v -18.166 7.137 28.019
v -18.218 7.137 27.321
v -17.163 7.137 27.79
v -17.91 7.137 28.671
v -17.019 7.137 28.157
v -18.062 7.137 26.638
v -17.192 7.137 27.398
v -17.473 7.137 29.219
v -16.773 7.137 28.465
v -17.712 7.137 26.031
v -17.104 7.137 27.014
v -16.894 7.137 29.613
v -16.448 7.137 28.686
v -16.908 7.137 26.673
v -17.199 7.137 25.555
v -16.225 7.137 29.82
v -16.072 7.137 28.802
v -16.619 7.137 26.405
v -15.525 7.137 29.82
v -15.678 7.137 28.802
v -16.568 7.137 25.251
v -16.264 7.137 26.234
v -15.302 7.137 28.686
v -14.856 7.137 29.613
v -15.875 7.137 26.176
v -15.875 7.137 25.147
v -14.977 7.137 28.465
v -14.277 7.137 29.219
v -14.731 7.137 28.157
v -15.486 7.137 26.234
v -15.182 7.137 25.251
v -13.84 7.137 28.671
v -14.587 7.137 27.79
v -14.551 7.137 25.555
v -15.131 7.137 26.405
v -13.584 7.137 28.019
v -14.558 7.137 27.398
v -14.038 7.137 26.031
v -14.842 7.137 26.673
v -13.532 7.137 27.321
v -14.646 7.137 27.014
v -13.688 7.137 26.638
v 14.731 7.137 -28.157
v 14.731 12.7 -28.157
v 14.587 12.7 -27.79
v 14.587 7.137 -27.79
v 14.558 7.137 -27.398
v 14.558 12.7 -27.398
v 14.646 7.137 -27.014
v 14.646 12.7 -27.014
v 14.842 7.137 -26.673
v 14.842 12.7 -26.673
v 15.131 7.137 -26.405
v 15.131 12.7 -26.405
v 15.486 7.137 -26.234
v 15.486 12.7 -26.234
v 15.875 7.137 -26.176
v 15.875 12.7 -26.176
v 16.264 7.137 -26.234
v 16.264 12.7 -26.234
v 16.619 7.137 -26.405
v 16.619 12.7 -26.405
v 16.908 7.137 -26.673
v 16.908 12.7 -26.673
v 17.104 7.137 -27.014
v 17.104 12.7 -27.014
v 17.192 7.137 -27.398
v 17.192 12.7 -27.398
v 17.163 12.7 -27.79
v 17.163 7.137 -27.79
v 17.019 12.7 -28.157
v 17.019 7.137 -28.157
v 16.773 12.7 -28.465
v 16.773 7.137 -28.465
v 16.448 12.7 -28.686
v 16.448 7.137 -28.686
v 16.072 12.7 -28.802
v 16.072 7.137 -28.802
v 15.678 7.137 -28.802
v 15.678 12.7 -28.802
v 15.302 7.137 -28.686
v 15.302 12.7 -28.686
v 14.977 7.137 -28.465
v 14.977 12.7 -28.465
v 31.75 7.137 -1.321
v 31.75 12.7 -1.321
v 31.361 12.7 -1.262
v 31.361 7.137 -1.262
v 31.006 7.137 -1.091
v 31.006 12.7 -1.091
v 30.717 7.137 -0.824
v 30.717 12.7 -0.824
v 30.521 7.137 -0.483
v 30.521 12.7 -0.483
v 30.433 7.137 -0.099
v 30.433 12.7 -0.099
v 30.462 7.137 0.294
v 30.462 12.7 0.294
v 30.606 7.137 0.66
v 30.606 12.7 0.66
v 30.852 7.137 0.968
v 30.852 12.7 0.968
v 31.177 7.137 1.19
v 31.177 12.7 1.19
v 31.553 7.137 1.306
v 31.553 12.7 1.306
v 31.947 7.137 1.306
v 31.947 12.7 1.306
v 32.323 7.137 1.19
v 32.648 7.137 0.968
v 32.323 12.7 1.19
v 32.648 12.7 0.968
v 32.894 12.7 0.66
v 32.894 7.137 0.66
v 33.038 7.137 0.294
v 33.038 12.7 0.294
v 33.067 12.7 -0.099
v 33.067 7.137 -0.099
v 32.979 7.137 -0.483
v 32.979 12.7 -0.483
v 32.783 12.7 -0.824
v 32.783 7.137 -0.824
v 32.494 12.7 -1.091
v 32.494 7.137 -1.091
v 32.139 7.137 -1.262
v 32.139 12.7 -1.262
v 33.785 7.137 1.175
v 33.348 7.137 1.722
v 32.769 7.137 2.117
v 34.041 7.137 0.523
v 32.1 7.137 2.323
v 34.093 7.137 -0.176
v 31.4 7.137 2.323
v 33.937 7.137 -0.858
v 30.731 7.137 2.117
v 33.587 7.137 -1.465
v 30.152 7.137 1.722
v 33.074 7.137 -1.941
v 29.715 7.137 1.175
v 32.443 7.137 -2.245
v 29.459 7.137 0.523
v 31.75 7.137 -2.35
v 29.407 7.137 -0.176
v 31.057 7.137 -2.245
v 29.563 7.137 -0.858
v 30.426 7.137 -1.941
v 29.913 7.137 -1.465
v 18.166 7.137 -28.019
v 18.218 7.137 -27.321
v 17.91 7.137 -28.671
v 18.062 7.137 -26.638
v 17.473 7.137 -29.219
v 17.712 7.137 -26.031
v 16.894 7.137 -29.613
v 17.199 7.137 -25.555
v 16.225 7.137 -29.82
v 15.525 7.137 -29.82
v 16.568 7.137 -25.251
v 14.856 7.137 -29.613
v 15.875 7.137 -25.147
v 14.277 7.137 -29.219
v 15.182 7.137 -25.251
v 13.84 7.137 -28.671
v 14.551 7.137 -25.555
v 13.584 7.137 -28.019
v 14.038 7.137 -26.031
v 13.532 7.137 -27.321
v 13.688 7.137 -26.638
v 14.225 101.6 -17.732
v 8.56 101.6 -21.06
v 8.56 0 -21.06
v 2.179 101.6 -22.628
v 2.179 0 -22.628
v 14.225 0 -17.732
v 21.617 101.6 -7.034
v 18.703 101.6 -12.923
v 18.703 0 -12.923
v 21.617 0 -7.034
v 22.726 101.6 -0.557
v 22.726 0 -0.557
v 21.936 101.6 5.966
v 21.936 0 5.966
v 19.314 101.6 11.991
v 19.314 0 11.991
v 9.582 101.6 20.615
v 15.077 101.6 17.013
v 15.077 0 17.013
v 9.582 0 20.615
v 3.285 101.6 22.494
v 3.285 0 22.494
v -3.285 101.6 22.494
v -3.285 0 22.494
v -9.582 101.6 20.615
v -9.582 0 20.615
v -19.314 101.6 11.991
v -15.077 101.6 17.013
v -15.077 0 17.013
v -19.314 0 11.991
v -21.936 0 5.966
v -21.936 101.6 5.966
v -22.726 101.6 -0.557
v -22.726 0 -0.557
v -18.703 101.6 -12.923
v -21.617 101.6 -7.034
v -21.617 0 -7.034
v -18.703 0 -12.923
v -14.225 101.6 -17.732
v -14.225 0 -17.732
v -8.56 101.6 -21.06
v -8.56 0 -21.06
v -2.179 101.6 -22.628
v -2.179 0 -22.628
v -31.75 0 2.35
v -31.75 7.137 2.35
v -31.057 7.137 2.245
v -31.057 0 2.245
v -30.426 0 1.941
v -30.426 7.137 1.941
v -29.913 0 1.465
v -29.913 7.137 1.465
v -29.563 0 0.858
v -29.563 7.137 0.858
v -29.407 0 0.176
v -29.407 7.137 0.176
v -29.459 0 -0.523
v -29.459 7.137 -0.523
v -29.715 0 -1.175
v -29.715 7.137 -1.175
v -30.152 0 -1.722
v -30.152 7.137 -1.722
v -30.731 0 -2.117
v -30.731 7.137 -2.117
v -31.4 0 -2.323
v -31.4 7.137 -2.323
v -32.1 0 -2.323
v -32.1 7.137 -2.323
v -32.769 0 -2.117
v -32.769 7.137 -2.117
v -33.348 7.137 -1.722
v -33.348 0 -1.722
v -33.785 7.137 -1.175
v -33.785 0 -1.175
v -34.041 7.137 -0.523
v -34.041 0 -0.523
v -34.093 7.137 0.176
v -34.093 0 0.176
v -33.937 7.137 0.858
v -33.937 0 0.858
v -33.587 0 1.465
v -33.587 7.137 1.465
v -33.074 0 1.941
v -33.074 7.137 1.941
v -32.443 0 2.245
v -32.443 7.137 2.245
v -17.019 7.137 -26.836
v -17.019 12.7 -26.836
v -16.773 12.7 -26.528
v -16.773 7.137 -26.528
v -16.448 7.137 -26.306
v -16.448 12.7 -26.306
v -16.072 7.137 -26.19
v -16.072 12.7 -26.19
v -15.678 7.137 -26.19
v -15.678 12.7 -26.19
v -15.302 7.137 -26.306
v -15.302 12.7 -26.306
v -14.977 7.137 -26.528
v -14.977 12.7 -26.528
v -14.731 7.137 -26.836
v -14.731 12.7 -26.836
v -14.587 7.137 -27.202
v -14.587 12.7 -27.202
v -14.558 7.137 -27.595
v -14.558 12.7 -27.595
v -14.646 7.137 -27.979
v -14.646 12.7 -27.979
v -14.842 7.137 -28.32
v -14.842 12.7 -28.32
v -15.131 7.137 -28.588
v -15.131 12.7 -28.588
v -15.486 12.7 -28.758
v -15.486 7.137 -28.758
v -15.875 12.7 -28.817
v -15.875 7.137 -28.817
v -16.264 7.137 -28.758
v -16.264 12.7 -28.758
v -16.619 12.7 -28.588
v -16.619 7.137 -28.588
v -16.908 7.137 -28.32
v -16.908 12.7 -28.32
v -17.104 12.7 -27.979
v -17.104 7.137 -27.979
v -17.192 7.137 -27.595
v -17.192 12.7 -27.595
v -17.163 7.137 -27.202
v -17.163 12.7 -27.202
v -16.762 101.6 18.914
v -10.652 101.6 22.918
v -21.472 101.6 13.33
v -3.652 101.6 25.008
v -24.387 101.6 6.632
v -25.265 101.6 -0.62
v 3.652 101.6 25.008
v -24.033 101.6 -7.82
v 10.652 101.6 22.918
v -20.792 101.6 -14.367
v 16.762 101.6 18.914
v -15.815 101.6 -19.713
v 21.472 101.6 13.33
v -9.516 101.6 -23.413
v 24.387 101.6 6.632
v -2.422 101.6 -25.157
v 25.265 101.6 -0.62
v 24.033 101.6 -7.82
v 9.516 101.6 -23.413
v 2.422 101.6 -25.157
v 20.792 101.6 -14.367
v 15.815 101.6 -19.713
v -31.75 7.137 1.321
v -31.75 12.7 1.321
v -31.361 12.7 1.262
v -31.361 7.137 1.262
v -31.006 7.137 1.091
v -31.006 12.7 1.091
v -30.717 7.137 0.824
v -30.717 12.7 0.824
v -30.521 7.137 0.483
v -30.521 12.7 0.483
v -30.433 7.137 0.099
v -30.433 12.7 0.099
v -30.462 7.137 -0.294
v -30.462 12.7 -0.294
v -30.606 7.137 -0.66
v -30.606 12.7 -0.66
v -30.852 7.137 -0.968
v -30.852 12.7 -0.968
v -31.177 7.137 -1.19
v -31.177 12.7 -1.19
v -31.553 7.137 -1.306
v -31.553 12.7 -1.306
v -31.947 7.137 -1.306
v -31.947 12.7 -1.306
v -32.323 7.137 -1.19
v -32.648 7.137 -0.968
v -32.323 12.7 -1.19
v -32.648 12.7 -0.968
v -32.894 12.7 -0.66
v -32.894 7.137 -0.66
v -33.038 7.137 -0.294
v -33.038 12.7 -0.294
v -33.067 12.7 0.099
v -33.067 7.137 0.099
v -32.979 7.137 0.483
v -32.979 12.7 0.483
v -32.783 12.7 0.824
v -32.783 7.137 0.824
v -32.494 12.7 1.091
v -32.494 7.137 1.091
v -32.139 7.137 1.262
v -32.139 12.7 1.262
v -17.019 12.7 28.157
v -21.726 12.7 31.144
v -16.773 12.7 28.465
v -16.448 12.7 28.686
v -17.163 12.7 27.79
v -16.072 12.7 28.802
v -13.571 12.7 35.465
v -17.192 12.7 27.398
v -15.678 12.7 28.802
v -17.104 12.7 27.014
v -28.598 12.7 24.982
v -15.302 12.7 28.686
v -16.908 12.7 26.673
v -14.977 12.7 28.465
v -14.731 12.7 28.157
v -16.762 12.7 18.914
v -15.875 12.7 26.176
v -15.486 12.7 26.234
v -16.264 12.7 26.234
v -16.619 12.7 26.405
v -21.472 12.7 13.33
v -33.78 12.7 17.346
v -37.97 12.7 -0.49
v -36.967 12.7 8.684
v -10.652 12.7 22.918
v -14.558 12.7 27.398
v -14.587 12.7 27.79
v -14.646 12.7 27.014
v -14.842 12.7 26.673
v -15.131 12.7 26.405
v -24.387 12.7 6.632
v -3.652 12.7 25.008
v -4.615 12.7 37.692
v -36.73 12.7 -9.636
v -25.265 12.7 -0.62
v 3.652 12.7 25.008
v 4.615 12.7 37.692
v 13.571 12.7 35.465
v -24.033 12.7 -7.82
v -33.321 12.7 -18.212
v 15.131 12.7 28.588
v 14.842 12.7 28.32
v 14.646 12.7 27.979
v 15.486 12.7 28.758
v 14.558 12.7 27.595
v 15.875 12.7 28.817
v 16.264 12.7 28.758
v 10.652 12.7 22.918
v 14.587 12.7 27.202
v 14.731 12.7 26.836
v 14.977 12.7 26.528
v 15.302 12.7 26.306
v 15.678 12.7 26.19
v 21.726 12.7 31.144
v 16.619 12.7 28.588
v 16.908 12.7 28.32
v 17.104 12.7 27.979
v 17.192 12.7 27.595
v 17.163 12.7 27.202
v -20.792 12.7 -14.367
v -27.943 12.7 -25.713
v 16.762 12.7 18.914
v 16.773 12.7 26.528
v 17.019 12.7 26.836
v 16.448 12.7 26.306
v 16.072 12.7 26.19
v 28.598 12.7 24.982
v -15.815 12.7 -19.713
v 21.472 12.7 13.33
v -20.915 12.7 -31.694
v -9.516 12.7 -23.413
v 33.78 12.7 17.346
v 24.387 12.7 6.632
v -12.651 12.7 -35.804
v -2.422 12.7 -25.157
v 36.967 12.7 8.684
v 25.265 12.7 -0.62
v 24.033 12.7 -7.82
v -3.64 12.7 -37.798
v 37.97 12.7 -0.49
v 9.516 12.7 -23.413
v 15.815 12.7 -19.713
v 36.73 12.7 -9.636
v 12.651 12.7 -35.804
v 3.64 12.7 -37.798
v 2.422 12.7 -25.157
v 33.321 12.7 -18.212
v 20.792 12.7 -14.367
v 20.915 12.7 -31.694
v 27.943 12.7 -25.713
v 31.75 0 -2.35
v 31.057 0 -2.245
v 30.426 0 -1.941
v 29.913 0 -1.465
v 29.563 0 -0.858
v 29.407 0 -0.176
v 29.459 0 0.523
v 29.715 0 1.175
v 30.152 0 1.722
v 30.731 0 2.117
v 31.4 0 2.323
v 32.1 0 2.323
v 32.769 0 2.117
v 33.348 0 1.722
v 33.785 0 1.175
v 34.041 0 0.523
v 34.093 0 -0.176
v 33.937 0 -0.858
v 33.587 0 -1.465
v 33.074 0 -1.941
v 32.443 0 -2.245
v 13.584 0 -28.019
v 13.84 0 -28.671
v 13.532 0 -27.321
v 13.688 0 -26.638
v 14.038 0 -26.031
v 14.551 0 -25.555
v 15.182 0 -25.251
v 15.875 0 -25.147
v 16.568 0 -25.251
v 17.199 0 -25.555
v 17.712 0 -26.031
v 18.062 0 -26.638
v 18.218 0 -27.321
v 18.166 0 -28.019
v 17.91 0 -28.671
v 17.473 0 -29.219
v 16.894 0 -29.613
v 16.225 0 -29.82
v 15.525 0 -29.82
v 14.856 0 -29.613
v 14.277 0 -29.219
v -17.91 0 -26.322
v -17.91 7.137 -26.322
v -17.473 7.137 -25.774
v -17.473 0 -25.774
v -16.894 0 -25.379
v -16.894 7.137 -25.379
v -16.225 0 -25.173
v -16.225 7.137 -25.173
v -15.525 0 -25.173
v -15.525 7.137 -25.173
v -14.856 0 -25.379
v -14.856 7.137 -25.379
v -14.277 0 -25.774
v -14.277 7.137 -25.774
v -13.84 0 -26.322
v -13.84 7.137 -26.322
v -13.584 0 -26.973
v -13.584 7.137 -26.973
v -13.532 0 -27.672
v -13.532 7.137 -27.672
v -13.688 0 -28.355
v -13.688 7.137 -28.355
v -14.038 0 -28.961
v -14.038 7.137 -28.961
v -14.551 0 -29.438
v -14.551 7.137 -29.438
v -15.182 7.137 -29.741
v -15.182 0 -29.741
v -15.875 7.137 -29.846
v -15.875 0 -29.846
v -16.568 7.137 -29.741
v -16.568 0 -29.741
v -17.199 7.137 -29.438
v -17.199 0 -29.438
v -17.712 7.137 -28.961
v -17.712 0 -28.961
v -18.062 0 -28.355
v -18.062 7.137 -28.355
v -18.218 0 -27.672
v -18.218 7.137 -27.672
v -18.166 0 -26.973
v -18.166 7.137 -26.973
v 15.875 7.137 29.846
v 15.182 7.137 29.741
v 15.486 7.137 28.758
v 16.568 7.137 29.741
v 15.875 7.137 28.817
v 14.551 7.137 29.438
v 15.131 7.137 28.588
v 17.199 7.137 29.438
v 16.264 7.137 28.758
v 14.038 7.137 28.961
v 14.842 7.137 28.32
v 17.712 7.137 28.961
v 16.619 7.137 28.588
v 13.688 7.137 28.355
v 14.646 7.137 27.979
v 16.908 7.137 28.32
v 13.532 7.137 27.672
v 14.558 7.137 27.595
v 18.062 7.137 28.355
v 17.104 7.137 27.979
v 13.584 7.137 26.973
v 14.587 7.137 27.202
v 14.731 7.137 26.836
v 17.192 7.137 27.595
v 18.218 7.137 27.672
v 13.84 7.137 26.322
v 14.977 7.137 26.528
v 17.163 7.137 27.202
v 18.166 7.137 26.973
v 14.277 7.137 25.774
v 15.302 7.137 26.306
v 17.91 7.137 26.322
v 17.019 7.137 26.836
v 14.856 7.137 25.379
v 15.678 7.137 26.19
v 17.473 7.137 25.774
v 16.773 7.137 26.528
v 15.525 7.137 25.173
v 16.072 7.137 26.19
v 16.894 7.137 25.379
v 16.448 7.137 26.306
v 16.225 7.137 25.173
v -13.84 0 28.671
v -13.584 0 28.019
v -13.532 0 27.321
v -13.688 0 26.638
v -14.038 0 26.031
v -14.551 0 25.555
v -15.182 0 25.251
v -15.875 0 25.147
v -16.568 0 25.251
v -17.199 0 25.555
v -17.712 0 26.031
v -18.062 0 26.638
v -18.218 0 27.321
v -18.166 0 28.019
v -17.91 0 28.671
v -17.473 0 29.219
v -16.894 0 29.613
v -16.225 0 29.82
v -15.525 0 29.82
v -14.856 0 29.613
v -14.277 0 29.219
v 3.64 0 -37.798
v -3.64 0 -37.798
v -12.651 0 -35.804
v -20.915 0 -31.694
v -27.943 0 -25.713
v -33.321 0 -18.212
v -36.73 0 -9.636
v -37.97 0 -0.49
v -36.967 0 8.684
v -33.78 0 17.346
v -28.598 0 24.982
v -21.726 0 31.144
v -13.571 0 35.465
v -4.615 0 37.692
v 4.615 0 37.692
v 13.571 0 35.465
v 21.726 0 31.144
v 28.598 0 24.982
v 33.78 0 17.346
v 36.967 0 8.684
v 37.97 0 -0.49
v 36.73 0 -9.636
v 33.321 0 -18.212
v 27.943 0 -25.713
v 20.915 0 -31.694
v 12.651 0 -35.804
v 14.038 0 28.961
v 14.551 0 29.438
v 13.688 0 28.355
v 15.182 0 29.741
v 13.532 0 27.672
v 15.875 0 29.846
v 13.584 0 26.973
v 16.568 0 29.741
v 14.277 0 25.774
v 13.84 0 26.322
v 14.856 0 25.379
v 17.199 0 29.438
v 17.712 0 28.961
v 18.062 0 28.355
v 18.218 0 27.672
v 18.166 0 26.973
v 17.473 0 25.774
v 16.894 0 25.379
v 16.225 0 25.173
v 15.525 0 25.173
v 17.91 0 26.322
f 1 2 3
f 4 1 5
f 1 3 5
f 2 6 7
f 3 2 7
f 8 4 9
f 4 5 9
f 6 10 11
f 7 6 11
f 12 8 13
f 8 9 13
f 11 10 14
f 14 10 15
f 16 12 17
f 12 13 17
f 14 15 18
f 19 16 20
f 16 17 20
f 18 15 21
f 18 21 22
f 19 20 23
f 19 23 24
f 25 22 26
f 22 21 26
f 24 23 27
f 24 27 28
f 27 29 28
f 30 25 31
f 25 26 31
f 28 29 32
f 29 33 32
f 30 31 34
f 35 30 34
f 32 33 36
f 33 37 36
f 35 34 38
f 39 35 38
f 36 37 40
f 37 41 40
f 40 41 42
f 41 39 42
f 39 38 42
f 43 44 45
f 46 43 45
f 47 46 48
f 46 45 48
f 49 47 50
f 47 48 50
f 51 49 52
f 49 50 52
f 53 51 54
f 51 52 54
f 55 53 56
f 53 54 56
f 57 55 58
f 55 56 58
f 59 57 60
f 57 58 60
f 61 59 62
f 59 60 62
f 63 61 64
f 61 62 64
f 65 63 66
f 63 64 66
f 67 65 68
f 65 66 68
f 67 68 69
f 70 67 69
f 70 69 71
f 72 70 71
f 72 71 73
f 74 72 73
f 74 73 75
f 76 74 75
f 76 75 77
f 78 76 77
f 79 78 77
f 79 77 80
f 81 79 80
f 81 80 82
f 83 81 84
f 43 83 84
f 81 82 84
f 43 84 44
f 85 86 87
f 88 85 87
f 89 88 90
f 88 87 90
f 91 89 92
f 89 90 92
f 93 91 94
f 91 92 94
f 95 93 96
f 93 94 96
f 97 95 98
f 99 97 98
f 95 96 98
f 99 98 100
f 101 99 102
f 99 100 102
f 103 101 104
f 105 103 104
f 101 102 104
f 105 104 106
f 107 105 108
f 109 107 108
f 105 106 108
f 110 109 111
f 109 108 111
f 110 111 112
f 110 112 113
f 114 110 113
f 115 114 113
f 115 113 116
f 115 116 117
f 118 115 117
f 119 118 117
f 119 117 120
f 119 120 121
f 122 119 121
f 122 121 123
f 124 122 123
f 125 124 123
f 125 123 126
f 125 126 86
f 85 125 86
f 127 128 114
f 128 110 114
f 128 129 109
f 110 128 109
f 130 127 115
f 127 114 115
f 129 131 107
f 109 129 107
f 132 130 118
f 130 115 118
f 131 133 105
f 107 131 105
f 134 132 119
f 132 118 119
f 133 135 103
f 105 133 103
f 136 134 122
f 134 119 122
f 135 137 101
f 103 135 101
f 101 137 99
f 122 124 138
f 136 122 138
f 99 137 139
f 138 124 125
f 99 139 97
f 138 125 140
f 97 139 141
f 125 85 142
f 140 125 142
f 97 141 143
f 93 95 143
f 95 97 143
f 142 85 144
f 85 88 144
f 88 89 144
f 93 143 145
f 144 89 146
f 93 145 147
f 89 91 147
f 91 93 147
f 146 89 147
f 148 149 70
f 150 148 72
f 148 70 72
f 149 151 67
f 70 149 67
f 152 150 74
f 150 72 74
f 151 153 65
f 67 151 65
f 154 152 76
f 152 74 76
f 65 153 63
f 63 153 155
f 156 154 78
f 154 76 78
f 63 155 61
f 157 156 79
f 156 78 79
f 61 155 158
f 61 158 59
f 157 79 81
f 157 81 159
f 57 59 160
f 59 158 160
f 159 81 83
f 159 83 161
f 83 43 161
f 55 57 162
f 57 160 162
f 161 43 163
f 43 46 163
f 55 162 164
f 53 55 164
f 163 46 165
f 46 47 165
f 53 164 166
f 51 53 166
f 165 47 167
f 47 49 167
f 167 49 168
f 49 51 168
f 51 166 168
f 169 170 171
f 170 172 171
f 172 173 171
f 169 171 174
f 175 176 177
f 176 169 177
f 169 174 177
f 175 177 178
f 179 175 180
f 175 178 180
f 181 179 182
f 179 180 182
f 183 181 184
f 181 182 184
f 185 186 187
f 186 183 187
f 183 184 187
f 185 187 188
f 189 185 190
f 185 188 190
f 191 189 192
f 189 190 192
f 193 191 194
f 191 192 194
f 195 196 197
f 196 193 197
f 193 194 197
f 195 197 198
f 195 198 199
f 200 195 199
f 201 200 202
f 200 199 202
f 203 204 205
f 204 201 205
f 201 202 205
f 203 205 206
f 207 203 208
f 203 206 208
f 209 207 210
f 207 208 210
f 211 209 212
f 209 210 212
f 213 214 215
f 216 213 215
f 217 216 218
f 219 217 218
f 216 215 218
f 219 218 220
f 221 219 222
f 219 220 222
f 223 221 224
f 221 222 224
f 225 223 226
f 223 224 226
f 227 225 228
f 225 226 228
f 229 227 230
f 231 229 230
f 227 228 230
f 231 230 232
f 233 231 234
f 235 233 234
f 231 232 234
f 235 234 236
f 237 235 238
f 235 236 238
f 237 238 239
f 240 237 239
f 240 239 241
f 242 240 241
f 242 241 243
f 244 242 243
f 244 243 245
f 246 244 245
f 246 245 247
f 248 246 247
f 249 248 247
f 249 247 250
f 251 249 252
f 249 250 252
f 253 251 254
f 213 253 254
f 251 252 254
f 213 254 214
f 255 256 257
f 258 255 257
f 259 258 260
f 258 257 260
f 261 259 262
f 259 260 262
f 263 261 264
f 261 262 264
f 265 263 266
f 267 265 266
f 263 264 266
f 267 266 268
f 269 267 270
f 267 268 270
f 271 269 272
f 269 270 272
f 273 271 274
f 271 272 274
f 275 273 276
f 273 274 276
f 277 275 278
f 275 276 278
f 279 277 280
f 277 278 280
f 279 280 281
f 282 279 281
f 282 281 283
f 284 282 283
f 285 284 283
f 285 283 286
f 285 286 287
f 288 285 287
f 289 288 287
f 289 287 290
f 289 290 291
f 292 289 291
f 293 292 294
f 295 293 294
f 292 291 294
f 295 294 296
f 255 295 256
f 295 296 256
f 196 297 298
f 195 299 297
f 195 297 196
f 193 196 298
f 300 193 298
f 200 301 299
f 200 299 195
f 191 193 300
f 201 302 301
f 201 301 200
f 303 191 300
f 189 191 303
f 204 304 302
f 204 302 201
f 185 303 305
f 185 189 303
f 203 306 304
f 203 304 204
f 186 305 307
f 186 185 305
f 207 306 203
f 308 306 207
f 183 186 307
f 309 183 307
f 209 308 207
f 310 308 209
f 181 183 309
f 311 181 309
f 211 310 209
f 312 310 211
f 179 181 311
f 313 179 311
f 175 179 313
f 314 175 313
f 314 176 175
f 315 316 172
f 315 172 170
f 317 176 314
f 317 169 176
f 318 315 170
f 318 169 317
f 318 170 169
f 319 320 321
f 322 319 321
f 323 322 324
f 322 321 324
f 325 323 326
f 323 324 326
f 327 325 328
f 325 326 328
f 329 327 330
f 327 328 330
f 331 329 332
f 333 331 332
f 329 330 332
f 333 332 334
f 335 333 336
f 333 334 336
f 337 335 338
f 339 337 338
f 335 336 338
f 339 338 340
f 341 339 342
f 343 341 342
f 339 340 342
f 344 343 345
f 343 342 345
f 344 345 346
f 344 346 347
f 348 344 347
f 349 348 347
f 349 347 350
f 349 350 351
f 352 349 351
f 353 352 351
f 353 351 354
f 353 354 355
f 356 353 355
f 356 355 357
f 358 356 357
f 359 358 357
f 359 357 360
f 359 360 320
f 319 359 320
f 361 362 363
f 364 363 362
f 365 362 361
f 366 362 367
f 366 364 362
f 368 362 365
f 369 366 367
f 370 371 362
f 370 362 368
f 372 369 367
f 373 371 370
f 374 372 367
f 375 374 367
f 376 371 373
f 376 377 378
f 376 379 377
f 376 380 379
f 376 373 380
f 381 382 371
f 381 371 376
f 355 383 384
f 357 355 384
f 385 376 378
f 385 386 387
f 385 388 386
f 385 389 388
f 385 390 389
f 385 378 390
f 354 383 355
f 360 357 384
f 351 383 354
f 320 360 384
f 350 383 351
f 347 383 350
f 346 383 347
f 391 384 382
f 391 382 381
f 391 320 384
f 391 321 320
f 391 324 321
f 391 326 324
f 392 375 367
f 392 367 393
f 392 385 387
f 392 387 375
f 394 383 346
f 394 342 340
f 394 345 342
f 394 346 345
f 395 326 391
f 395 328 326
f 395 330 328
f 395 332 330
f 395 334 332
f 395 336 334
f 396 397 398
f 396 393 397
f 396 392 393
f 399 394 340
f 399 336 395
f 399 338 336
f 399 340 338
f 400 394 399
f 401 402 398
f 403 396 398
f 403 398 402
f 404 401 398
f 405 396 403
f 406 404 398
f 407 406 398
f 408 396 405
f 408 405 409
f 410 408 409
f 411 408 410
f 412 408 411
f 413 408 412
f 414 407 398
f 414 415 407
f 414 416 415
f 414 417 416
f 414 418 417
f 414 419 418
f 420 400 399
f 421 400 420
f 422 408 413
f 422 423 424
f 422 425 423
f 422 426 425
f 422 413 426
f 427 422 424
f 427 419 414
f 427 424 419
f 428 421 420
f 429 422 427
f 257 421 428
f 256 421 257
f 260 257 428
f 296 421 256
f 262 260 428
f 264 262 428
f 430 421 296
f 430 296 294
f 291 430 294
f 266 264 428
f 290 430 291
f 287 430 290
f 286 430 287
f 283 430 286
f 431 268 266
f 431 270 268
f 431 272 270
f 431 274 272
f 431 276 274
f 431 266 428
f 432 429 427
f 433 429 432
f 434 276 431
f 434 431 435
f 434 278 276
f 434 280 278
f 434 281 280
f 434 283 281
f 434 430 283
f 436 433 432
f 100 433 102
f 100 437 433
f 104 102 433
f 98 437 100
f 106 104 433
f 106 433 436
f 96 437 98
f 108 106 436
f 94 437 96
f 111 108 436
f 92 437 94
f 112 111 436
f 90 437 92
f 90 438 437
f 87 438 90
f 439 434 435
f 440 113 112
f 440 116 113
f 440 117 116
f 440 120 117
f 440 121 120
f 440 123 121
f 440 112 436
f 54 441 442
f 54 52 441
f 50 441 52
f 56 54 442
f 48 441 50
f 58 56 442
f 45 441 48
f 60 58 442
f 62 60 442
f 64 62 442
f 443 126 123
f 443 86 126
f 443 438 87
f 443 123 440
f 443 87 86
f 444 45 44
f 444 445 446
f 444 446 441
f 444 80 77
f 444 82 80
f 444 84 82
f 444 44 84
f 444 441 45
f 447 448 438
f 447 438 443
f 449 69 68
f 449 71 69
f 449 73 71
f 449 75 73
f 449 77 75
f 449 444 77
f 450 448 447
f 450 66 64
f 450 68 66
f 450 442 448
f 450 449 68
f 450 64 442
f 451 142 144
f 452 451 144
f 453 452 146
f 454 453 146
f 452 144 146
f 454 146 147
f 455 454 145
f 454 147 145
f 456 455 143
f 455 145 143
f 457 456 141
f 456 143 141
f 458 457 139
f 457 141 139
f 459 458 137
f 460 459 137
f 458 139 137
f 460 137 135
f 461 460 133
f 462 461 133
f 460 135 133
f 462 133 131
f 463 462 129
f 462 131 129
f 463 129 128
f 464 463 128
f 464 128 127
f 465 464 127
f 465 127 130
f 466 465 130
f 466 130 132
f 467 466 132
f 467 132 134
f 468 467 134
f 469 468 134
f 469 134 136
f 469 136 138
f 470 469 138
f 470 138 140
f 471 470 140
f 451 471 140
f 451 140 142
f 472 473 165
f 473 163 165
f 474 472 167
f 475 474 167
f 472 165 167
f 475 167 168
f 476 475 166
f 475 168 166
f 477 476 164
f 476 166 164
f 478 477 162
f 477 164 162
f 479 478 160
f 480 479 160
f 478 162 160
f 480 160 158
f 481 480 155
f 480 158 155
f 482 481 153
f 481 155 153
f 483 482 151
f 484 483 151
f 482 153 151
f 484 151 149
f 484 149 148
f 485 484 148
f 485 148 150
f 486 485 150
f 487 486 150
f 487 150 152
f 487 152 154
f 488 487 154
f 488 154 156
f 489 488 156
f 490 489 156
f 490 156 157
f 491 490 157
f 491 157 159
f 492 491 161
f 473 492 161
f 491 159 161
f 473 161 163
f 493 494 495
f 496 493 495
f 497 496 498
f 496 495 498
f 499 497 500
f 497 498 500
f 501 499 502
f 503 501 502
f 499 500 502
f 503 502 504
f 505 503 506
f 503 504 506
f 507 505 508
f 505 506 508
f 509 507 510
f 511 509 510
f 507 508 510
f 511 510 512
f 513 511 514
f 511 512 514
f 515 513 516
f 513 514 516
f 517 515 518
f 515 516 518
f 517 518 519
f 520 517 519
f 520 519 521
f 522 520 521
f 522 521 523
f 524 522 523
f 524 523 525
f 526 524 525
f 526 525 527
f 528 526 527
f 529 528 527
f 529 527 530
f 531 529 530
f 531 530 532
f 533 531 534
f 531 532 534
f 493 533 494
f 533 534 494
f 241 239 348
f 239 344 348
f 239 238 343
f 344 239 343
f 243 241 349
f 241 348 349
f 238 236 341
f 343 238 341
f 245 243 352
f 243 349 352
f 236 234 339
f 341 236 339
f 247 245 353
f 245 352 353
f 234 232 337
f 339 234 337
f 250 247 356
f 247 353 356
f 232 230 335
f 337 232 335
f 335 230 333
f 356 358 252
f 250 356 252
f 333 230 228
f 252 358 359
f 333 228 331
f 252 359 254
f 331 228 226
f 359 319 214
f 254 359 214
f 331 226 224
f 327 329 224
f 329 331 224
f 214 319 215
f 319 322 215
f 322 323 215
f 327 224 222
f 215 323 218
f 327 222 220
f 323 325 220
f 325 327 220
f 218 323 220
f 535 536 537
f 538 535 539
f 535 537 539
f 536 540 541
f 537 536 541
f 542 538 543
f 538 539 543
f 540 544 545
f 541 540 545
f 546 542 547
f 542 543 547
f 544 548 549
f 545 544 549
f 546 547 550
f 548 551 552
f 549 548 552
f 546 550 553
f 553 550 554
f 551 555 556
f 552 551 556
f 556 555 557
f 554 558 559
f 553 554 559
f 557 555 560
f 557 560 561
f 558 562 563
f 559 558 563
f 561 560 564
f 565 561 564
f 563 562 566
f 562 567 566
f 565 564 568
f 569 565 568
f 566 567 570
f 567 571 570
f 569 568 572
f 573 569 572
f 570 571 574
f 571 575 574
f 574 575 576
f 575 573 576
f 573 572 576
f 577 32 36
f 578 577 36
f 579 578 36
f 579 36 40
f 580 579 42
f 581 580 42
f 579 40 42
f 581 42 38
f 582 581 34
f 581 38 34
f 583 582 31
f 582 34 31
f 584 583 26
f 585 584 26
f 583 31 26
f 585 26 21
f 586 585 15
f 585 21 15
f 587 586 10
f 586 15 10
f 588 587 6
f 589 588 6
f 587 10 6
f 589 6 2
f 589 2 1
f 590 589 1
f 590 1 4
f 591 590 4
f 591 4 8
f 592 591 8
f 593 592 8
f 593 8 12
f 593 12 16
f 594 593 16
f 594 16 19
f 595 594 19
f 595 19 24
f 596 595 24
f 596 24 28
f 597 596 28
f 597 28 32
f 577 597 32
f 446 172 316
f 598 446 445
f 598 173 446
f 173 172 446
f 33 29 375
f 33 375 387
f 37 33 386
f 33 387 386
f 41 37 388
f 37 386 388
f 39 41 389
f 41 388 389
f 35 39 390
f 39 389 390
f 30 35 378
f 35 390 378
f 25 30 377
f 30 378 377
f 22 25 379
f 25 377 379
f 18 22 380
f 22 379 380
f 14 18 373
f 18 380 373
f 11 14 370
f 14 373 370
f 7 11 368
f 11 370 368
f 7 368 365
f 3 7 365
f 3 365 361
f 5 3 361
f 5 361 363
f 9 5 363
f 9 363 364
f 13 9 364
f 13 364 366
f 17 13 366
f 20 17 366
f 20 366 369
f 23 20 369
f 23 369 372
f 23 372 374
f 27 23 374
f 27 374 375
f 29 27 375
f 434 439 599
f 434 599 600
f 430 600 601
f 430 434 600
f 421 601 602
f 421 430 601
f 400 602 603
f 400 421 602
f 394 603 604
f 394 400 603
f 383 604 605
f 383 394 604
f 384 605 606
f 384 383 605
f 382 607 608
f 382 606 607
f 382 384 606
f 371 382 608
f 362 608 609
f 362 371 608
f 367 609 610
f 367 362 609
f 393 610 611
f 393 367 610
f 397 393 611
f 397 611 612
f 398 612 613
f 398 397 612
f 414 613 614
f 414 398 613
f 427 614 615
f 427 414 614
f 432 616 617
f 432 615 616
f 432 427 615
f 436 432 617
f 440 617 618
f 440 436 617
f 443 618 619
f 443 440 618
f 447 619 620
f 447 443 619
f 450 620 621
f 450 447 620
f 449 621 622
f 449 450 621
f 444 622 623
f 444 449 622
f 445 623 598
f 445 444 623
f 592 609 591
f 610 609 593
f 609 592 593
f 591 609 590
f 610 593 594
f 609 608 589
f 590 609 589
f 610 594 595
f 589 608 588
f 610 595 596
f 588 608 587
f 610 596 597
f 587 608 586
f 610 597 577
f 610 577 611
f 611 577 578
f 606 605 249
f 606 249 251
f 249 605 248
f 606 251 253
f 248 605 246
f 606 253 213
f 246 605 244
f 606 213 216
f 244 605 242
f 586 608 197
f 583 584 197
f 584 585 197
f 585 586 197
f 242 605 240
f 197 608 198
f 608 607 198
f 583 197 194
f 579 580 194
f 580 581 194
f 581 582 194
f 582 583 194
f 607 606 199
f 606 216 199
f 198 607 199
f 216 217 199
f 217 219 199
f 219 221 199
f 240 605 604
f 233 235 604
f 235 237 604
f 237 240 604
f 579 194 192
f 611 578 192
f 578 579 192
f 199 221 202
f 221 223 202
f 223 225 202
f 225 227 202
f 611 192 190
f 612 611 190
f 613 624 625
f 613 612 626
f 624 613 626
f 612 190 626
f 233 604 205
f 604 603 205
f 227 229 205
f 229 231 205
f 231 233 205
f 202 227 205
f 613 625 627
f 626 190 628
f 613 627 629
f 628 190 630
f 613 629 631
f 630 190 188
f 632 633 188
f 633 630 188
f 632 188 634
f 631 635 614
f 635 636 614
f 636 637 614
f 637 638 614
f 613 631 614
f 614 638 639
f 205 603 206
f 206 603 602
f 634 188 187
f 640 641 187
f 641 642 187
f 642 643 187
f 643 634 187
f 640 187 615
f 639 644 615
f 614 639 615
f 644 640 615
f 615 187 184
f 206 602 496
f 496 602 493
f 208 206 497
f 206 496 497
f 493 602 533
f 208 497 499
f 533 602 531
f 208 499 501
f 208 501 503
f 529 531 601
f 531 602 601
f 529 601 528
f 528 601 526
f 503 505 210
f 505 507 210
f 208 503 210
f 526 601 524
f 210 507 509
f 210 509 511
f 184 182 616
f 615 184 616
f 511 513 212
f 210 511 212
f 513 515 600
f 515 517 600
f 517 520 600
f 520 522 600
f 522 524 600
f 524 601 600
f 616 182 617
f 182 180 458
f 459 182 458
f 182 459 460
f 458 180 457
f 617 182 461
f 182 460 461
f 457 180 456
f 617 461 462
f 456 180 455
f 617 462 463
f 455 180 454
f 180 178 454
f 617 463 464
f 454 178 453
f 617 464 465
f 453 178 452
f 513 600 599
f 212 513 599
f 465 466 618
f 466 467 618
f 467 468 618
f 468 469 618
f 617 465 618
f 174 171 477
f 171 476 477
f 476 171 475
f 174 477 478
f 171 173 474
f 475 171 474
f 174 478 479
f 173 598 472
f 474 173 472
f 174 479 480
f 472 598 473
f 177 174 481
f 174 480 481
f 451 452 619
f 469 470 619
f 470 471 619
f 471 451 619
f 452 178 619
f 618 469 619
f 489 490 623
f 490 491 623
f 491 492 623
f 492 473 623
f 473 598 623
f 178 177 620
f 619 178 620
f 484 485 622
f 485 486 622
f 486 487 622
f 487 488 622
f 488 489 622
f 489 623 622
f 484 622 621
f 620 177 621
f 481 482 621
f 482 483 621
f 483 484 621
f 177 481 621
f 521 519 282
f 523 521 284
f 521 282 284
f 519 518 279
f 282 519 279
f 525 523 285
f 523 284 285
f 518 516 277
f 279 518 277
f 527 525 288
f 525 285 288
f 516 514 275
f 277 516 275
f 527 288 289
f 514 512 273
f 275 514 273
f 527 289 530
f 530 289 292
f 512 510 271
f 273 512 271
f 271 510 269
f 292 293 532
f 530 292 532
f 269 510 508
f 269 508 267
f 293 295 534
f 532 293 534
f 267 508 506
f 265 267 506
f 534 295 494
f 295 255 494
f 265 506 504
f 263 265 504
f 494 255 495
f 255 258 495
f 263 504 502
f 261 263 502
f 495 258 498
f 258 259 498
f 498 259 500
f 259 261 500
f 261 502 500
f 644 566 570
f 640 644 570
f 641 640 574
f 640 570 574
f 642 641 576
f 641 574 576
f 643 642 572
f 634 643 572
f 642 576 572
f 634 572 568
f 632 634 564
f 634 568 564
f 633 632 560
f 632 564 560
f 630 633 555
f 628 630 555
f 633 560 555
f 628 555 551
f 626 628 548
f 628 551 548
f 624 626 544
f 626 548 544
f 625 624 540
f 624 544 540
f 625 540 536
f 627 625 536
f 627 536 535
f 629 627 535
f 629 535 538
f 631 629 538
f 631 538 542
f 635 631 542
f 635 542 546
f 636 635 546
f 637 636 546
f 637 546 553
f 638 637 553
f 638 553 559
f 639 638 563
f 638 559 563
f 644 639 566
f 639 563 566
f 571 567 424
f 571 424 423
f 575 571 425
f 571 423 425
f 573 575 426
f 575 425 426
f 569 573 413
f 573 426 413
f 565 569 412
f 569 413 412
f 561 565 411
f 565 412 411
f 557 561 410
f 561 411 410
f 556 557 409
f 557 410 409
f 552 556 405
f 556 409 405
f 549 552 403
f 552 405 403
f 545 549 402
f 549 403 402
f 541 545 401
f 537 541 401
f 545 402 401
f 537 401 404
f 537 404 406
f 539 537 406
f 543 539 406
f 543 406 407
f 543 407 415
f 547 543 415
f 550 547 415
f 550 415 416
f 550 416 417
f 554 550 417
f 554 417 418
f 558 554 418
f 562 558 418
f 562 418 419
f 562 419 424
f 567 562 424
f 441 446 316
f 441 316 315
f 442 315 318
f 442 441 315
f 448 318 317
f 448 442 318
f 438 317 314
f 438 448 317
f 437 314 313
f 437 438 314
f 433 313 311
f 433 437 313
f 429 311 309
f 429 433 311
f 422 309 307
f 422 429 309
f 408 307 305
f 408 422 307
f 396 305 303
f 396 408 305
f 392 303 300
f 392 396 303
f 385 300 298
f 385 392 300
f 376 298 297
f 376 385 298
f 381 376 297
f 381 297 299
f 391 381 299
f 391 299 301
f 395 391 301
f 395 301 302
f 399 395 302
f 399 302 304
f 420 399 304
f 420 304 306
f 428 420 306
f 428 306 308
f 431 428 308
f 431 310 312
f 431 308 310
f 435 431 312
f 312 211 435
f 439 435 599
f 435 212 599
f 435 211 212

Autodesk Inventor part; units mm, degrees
ref_plane "YZ Plane" through (0, 0, 0) normal (1, 0, 0) x (0, 1, 0)
ref_plane "XZ Plane" through (0, 0, 0) normal (0, 1, 0) x (-1, 0, 0)
ref_plane "XY Plane" through (0, 0, 0) normal (0, 0, 1) x (1, 0, 0)
sketch "Sketch12" plane through (0, 0, 0) normal (0, 0, 1) x (1, 0, 0)
  line L0 (37.973, 0) -> (37.973, 12.7)
  line L1 (0, 0) -> (0, 101.6) construction
  line L2 (25.273, 101.6) -> (25.273, 12.7)
  line L3 (25.273, 12.7) -> (37.973, 12.7)
  line L4 (25.273, 101.6) -> (22.733, 101.6)
  line L5 (22.733, 101.6) -> (22.733, 0)
  line L6 (22.733, 0) -> (37.973, 0)
  line L7 (0, -20.32) -> (0, 121.92) projected
  dimension "d49" = 12.7
  dimension "d50" = 101.6
  dimension "d53" = 2.54
  dimension "d60" = 12.7
  dimension "d72" = 22.733
revolve "Revolution3" add sketch "Sketch12" angle 360 about axis through (0, 0, 0) along (0, 1, 0)
sketch "Sketch13" plane through (0, 0, 0) normal (0, -1, 0) x (1, 0, 0)
  line L0 (0, 0) -> (0, -37.973) construction
  circle A0 centre (0, 0) radius 37.973 construction
  line L1 (0, 0) -> (-3.6396, -37.7982)
  line L2 (0, 0) -> (3.6396, -37.7982)
  arc A1 (-3.6396, -37.7982) -> (3.6396, -37.7982) centre (0, 0) ccw
  dimension "d56" = 5.5
  dimension "d57" = 5.5
extrude "Extrusion5" cut sketch "Sketch13" against normal through all
sketch "Sketch17" plane through (0, 0, 0) normal (0, -1, 0) x (1, 0, 0)
  arc A0 (3.6396, -37.7982) -> (-3.6396, -37.7982) centre (0, 0) ccw projected
  point P0 (31.75, 0)
  dimension "d73" = 31.75
hole "Hole4" at (31.75, 0, 0) direction (0, 1, 0) diameter 2.6416 end through all counterbore diameter 4.699 counterbore depth 7.1374 thread size "6-32 UNC" class "2B" standard "ANSI Unified Screw Threads"
pattern_circular "Circular Pattern2" count 6 over 360 about axis through (0, -10, 0) along (0, 1, 0) of "Hole4"
equation "\"d56\" = 0.5 * angleForSlot"
equation "\"d57\" = 0.5 * angleForSlot"
equation "\"angleForSlot\" = 11deg"
properties part number "ExternalStationaryOuterRing" material "LCP Plastic"
